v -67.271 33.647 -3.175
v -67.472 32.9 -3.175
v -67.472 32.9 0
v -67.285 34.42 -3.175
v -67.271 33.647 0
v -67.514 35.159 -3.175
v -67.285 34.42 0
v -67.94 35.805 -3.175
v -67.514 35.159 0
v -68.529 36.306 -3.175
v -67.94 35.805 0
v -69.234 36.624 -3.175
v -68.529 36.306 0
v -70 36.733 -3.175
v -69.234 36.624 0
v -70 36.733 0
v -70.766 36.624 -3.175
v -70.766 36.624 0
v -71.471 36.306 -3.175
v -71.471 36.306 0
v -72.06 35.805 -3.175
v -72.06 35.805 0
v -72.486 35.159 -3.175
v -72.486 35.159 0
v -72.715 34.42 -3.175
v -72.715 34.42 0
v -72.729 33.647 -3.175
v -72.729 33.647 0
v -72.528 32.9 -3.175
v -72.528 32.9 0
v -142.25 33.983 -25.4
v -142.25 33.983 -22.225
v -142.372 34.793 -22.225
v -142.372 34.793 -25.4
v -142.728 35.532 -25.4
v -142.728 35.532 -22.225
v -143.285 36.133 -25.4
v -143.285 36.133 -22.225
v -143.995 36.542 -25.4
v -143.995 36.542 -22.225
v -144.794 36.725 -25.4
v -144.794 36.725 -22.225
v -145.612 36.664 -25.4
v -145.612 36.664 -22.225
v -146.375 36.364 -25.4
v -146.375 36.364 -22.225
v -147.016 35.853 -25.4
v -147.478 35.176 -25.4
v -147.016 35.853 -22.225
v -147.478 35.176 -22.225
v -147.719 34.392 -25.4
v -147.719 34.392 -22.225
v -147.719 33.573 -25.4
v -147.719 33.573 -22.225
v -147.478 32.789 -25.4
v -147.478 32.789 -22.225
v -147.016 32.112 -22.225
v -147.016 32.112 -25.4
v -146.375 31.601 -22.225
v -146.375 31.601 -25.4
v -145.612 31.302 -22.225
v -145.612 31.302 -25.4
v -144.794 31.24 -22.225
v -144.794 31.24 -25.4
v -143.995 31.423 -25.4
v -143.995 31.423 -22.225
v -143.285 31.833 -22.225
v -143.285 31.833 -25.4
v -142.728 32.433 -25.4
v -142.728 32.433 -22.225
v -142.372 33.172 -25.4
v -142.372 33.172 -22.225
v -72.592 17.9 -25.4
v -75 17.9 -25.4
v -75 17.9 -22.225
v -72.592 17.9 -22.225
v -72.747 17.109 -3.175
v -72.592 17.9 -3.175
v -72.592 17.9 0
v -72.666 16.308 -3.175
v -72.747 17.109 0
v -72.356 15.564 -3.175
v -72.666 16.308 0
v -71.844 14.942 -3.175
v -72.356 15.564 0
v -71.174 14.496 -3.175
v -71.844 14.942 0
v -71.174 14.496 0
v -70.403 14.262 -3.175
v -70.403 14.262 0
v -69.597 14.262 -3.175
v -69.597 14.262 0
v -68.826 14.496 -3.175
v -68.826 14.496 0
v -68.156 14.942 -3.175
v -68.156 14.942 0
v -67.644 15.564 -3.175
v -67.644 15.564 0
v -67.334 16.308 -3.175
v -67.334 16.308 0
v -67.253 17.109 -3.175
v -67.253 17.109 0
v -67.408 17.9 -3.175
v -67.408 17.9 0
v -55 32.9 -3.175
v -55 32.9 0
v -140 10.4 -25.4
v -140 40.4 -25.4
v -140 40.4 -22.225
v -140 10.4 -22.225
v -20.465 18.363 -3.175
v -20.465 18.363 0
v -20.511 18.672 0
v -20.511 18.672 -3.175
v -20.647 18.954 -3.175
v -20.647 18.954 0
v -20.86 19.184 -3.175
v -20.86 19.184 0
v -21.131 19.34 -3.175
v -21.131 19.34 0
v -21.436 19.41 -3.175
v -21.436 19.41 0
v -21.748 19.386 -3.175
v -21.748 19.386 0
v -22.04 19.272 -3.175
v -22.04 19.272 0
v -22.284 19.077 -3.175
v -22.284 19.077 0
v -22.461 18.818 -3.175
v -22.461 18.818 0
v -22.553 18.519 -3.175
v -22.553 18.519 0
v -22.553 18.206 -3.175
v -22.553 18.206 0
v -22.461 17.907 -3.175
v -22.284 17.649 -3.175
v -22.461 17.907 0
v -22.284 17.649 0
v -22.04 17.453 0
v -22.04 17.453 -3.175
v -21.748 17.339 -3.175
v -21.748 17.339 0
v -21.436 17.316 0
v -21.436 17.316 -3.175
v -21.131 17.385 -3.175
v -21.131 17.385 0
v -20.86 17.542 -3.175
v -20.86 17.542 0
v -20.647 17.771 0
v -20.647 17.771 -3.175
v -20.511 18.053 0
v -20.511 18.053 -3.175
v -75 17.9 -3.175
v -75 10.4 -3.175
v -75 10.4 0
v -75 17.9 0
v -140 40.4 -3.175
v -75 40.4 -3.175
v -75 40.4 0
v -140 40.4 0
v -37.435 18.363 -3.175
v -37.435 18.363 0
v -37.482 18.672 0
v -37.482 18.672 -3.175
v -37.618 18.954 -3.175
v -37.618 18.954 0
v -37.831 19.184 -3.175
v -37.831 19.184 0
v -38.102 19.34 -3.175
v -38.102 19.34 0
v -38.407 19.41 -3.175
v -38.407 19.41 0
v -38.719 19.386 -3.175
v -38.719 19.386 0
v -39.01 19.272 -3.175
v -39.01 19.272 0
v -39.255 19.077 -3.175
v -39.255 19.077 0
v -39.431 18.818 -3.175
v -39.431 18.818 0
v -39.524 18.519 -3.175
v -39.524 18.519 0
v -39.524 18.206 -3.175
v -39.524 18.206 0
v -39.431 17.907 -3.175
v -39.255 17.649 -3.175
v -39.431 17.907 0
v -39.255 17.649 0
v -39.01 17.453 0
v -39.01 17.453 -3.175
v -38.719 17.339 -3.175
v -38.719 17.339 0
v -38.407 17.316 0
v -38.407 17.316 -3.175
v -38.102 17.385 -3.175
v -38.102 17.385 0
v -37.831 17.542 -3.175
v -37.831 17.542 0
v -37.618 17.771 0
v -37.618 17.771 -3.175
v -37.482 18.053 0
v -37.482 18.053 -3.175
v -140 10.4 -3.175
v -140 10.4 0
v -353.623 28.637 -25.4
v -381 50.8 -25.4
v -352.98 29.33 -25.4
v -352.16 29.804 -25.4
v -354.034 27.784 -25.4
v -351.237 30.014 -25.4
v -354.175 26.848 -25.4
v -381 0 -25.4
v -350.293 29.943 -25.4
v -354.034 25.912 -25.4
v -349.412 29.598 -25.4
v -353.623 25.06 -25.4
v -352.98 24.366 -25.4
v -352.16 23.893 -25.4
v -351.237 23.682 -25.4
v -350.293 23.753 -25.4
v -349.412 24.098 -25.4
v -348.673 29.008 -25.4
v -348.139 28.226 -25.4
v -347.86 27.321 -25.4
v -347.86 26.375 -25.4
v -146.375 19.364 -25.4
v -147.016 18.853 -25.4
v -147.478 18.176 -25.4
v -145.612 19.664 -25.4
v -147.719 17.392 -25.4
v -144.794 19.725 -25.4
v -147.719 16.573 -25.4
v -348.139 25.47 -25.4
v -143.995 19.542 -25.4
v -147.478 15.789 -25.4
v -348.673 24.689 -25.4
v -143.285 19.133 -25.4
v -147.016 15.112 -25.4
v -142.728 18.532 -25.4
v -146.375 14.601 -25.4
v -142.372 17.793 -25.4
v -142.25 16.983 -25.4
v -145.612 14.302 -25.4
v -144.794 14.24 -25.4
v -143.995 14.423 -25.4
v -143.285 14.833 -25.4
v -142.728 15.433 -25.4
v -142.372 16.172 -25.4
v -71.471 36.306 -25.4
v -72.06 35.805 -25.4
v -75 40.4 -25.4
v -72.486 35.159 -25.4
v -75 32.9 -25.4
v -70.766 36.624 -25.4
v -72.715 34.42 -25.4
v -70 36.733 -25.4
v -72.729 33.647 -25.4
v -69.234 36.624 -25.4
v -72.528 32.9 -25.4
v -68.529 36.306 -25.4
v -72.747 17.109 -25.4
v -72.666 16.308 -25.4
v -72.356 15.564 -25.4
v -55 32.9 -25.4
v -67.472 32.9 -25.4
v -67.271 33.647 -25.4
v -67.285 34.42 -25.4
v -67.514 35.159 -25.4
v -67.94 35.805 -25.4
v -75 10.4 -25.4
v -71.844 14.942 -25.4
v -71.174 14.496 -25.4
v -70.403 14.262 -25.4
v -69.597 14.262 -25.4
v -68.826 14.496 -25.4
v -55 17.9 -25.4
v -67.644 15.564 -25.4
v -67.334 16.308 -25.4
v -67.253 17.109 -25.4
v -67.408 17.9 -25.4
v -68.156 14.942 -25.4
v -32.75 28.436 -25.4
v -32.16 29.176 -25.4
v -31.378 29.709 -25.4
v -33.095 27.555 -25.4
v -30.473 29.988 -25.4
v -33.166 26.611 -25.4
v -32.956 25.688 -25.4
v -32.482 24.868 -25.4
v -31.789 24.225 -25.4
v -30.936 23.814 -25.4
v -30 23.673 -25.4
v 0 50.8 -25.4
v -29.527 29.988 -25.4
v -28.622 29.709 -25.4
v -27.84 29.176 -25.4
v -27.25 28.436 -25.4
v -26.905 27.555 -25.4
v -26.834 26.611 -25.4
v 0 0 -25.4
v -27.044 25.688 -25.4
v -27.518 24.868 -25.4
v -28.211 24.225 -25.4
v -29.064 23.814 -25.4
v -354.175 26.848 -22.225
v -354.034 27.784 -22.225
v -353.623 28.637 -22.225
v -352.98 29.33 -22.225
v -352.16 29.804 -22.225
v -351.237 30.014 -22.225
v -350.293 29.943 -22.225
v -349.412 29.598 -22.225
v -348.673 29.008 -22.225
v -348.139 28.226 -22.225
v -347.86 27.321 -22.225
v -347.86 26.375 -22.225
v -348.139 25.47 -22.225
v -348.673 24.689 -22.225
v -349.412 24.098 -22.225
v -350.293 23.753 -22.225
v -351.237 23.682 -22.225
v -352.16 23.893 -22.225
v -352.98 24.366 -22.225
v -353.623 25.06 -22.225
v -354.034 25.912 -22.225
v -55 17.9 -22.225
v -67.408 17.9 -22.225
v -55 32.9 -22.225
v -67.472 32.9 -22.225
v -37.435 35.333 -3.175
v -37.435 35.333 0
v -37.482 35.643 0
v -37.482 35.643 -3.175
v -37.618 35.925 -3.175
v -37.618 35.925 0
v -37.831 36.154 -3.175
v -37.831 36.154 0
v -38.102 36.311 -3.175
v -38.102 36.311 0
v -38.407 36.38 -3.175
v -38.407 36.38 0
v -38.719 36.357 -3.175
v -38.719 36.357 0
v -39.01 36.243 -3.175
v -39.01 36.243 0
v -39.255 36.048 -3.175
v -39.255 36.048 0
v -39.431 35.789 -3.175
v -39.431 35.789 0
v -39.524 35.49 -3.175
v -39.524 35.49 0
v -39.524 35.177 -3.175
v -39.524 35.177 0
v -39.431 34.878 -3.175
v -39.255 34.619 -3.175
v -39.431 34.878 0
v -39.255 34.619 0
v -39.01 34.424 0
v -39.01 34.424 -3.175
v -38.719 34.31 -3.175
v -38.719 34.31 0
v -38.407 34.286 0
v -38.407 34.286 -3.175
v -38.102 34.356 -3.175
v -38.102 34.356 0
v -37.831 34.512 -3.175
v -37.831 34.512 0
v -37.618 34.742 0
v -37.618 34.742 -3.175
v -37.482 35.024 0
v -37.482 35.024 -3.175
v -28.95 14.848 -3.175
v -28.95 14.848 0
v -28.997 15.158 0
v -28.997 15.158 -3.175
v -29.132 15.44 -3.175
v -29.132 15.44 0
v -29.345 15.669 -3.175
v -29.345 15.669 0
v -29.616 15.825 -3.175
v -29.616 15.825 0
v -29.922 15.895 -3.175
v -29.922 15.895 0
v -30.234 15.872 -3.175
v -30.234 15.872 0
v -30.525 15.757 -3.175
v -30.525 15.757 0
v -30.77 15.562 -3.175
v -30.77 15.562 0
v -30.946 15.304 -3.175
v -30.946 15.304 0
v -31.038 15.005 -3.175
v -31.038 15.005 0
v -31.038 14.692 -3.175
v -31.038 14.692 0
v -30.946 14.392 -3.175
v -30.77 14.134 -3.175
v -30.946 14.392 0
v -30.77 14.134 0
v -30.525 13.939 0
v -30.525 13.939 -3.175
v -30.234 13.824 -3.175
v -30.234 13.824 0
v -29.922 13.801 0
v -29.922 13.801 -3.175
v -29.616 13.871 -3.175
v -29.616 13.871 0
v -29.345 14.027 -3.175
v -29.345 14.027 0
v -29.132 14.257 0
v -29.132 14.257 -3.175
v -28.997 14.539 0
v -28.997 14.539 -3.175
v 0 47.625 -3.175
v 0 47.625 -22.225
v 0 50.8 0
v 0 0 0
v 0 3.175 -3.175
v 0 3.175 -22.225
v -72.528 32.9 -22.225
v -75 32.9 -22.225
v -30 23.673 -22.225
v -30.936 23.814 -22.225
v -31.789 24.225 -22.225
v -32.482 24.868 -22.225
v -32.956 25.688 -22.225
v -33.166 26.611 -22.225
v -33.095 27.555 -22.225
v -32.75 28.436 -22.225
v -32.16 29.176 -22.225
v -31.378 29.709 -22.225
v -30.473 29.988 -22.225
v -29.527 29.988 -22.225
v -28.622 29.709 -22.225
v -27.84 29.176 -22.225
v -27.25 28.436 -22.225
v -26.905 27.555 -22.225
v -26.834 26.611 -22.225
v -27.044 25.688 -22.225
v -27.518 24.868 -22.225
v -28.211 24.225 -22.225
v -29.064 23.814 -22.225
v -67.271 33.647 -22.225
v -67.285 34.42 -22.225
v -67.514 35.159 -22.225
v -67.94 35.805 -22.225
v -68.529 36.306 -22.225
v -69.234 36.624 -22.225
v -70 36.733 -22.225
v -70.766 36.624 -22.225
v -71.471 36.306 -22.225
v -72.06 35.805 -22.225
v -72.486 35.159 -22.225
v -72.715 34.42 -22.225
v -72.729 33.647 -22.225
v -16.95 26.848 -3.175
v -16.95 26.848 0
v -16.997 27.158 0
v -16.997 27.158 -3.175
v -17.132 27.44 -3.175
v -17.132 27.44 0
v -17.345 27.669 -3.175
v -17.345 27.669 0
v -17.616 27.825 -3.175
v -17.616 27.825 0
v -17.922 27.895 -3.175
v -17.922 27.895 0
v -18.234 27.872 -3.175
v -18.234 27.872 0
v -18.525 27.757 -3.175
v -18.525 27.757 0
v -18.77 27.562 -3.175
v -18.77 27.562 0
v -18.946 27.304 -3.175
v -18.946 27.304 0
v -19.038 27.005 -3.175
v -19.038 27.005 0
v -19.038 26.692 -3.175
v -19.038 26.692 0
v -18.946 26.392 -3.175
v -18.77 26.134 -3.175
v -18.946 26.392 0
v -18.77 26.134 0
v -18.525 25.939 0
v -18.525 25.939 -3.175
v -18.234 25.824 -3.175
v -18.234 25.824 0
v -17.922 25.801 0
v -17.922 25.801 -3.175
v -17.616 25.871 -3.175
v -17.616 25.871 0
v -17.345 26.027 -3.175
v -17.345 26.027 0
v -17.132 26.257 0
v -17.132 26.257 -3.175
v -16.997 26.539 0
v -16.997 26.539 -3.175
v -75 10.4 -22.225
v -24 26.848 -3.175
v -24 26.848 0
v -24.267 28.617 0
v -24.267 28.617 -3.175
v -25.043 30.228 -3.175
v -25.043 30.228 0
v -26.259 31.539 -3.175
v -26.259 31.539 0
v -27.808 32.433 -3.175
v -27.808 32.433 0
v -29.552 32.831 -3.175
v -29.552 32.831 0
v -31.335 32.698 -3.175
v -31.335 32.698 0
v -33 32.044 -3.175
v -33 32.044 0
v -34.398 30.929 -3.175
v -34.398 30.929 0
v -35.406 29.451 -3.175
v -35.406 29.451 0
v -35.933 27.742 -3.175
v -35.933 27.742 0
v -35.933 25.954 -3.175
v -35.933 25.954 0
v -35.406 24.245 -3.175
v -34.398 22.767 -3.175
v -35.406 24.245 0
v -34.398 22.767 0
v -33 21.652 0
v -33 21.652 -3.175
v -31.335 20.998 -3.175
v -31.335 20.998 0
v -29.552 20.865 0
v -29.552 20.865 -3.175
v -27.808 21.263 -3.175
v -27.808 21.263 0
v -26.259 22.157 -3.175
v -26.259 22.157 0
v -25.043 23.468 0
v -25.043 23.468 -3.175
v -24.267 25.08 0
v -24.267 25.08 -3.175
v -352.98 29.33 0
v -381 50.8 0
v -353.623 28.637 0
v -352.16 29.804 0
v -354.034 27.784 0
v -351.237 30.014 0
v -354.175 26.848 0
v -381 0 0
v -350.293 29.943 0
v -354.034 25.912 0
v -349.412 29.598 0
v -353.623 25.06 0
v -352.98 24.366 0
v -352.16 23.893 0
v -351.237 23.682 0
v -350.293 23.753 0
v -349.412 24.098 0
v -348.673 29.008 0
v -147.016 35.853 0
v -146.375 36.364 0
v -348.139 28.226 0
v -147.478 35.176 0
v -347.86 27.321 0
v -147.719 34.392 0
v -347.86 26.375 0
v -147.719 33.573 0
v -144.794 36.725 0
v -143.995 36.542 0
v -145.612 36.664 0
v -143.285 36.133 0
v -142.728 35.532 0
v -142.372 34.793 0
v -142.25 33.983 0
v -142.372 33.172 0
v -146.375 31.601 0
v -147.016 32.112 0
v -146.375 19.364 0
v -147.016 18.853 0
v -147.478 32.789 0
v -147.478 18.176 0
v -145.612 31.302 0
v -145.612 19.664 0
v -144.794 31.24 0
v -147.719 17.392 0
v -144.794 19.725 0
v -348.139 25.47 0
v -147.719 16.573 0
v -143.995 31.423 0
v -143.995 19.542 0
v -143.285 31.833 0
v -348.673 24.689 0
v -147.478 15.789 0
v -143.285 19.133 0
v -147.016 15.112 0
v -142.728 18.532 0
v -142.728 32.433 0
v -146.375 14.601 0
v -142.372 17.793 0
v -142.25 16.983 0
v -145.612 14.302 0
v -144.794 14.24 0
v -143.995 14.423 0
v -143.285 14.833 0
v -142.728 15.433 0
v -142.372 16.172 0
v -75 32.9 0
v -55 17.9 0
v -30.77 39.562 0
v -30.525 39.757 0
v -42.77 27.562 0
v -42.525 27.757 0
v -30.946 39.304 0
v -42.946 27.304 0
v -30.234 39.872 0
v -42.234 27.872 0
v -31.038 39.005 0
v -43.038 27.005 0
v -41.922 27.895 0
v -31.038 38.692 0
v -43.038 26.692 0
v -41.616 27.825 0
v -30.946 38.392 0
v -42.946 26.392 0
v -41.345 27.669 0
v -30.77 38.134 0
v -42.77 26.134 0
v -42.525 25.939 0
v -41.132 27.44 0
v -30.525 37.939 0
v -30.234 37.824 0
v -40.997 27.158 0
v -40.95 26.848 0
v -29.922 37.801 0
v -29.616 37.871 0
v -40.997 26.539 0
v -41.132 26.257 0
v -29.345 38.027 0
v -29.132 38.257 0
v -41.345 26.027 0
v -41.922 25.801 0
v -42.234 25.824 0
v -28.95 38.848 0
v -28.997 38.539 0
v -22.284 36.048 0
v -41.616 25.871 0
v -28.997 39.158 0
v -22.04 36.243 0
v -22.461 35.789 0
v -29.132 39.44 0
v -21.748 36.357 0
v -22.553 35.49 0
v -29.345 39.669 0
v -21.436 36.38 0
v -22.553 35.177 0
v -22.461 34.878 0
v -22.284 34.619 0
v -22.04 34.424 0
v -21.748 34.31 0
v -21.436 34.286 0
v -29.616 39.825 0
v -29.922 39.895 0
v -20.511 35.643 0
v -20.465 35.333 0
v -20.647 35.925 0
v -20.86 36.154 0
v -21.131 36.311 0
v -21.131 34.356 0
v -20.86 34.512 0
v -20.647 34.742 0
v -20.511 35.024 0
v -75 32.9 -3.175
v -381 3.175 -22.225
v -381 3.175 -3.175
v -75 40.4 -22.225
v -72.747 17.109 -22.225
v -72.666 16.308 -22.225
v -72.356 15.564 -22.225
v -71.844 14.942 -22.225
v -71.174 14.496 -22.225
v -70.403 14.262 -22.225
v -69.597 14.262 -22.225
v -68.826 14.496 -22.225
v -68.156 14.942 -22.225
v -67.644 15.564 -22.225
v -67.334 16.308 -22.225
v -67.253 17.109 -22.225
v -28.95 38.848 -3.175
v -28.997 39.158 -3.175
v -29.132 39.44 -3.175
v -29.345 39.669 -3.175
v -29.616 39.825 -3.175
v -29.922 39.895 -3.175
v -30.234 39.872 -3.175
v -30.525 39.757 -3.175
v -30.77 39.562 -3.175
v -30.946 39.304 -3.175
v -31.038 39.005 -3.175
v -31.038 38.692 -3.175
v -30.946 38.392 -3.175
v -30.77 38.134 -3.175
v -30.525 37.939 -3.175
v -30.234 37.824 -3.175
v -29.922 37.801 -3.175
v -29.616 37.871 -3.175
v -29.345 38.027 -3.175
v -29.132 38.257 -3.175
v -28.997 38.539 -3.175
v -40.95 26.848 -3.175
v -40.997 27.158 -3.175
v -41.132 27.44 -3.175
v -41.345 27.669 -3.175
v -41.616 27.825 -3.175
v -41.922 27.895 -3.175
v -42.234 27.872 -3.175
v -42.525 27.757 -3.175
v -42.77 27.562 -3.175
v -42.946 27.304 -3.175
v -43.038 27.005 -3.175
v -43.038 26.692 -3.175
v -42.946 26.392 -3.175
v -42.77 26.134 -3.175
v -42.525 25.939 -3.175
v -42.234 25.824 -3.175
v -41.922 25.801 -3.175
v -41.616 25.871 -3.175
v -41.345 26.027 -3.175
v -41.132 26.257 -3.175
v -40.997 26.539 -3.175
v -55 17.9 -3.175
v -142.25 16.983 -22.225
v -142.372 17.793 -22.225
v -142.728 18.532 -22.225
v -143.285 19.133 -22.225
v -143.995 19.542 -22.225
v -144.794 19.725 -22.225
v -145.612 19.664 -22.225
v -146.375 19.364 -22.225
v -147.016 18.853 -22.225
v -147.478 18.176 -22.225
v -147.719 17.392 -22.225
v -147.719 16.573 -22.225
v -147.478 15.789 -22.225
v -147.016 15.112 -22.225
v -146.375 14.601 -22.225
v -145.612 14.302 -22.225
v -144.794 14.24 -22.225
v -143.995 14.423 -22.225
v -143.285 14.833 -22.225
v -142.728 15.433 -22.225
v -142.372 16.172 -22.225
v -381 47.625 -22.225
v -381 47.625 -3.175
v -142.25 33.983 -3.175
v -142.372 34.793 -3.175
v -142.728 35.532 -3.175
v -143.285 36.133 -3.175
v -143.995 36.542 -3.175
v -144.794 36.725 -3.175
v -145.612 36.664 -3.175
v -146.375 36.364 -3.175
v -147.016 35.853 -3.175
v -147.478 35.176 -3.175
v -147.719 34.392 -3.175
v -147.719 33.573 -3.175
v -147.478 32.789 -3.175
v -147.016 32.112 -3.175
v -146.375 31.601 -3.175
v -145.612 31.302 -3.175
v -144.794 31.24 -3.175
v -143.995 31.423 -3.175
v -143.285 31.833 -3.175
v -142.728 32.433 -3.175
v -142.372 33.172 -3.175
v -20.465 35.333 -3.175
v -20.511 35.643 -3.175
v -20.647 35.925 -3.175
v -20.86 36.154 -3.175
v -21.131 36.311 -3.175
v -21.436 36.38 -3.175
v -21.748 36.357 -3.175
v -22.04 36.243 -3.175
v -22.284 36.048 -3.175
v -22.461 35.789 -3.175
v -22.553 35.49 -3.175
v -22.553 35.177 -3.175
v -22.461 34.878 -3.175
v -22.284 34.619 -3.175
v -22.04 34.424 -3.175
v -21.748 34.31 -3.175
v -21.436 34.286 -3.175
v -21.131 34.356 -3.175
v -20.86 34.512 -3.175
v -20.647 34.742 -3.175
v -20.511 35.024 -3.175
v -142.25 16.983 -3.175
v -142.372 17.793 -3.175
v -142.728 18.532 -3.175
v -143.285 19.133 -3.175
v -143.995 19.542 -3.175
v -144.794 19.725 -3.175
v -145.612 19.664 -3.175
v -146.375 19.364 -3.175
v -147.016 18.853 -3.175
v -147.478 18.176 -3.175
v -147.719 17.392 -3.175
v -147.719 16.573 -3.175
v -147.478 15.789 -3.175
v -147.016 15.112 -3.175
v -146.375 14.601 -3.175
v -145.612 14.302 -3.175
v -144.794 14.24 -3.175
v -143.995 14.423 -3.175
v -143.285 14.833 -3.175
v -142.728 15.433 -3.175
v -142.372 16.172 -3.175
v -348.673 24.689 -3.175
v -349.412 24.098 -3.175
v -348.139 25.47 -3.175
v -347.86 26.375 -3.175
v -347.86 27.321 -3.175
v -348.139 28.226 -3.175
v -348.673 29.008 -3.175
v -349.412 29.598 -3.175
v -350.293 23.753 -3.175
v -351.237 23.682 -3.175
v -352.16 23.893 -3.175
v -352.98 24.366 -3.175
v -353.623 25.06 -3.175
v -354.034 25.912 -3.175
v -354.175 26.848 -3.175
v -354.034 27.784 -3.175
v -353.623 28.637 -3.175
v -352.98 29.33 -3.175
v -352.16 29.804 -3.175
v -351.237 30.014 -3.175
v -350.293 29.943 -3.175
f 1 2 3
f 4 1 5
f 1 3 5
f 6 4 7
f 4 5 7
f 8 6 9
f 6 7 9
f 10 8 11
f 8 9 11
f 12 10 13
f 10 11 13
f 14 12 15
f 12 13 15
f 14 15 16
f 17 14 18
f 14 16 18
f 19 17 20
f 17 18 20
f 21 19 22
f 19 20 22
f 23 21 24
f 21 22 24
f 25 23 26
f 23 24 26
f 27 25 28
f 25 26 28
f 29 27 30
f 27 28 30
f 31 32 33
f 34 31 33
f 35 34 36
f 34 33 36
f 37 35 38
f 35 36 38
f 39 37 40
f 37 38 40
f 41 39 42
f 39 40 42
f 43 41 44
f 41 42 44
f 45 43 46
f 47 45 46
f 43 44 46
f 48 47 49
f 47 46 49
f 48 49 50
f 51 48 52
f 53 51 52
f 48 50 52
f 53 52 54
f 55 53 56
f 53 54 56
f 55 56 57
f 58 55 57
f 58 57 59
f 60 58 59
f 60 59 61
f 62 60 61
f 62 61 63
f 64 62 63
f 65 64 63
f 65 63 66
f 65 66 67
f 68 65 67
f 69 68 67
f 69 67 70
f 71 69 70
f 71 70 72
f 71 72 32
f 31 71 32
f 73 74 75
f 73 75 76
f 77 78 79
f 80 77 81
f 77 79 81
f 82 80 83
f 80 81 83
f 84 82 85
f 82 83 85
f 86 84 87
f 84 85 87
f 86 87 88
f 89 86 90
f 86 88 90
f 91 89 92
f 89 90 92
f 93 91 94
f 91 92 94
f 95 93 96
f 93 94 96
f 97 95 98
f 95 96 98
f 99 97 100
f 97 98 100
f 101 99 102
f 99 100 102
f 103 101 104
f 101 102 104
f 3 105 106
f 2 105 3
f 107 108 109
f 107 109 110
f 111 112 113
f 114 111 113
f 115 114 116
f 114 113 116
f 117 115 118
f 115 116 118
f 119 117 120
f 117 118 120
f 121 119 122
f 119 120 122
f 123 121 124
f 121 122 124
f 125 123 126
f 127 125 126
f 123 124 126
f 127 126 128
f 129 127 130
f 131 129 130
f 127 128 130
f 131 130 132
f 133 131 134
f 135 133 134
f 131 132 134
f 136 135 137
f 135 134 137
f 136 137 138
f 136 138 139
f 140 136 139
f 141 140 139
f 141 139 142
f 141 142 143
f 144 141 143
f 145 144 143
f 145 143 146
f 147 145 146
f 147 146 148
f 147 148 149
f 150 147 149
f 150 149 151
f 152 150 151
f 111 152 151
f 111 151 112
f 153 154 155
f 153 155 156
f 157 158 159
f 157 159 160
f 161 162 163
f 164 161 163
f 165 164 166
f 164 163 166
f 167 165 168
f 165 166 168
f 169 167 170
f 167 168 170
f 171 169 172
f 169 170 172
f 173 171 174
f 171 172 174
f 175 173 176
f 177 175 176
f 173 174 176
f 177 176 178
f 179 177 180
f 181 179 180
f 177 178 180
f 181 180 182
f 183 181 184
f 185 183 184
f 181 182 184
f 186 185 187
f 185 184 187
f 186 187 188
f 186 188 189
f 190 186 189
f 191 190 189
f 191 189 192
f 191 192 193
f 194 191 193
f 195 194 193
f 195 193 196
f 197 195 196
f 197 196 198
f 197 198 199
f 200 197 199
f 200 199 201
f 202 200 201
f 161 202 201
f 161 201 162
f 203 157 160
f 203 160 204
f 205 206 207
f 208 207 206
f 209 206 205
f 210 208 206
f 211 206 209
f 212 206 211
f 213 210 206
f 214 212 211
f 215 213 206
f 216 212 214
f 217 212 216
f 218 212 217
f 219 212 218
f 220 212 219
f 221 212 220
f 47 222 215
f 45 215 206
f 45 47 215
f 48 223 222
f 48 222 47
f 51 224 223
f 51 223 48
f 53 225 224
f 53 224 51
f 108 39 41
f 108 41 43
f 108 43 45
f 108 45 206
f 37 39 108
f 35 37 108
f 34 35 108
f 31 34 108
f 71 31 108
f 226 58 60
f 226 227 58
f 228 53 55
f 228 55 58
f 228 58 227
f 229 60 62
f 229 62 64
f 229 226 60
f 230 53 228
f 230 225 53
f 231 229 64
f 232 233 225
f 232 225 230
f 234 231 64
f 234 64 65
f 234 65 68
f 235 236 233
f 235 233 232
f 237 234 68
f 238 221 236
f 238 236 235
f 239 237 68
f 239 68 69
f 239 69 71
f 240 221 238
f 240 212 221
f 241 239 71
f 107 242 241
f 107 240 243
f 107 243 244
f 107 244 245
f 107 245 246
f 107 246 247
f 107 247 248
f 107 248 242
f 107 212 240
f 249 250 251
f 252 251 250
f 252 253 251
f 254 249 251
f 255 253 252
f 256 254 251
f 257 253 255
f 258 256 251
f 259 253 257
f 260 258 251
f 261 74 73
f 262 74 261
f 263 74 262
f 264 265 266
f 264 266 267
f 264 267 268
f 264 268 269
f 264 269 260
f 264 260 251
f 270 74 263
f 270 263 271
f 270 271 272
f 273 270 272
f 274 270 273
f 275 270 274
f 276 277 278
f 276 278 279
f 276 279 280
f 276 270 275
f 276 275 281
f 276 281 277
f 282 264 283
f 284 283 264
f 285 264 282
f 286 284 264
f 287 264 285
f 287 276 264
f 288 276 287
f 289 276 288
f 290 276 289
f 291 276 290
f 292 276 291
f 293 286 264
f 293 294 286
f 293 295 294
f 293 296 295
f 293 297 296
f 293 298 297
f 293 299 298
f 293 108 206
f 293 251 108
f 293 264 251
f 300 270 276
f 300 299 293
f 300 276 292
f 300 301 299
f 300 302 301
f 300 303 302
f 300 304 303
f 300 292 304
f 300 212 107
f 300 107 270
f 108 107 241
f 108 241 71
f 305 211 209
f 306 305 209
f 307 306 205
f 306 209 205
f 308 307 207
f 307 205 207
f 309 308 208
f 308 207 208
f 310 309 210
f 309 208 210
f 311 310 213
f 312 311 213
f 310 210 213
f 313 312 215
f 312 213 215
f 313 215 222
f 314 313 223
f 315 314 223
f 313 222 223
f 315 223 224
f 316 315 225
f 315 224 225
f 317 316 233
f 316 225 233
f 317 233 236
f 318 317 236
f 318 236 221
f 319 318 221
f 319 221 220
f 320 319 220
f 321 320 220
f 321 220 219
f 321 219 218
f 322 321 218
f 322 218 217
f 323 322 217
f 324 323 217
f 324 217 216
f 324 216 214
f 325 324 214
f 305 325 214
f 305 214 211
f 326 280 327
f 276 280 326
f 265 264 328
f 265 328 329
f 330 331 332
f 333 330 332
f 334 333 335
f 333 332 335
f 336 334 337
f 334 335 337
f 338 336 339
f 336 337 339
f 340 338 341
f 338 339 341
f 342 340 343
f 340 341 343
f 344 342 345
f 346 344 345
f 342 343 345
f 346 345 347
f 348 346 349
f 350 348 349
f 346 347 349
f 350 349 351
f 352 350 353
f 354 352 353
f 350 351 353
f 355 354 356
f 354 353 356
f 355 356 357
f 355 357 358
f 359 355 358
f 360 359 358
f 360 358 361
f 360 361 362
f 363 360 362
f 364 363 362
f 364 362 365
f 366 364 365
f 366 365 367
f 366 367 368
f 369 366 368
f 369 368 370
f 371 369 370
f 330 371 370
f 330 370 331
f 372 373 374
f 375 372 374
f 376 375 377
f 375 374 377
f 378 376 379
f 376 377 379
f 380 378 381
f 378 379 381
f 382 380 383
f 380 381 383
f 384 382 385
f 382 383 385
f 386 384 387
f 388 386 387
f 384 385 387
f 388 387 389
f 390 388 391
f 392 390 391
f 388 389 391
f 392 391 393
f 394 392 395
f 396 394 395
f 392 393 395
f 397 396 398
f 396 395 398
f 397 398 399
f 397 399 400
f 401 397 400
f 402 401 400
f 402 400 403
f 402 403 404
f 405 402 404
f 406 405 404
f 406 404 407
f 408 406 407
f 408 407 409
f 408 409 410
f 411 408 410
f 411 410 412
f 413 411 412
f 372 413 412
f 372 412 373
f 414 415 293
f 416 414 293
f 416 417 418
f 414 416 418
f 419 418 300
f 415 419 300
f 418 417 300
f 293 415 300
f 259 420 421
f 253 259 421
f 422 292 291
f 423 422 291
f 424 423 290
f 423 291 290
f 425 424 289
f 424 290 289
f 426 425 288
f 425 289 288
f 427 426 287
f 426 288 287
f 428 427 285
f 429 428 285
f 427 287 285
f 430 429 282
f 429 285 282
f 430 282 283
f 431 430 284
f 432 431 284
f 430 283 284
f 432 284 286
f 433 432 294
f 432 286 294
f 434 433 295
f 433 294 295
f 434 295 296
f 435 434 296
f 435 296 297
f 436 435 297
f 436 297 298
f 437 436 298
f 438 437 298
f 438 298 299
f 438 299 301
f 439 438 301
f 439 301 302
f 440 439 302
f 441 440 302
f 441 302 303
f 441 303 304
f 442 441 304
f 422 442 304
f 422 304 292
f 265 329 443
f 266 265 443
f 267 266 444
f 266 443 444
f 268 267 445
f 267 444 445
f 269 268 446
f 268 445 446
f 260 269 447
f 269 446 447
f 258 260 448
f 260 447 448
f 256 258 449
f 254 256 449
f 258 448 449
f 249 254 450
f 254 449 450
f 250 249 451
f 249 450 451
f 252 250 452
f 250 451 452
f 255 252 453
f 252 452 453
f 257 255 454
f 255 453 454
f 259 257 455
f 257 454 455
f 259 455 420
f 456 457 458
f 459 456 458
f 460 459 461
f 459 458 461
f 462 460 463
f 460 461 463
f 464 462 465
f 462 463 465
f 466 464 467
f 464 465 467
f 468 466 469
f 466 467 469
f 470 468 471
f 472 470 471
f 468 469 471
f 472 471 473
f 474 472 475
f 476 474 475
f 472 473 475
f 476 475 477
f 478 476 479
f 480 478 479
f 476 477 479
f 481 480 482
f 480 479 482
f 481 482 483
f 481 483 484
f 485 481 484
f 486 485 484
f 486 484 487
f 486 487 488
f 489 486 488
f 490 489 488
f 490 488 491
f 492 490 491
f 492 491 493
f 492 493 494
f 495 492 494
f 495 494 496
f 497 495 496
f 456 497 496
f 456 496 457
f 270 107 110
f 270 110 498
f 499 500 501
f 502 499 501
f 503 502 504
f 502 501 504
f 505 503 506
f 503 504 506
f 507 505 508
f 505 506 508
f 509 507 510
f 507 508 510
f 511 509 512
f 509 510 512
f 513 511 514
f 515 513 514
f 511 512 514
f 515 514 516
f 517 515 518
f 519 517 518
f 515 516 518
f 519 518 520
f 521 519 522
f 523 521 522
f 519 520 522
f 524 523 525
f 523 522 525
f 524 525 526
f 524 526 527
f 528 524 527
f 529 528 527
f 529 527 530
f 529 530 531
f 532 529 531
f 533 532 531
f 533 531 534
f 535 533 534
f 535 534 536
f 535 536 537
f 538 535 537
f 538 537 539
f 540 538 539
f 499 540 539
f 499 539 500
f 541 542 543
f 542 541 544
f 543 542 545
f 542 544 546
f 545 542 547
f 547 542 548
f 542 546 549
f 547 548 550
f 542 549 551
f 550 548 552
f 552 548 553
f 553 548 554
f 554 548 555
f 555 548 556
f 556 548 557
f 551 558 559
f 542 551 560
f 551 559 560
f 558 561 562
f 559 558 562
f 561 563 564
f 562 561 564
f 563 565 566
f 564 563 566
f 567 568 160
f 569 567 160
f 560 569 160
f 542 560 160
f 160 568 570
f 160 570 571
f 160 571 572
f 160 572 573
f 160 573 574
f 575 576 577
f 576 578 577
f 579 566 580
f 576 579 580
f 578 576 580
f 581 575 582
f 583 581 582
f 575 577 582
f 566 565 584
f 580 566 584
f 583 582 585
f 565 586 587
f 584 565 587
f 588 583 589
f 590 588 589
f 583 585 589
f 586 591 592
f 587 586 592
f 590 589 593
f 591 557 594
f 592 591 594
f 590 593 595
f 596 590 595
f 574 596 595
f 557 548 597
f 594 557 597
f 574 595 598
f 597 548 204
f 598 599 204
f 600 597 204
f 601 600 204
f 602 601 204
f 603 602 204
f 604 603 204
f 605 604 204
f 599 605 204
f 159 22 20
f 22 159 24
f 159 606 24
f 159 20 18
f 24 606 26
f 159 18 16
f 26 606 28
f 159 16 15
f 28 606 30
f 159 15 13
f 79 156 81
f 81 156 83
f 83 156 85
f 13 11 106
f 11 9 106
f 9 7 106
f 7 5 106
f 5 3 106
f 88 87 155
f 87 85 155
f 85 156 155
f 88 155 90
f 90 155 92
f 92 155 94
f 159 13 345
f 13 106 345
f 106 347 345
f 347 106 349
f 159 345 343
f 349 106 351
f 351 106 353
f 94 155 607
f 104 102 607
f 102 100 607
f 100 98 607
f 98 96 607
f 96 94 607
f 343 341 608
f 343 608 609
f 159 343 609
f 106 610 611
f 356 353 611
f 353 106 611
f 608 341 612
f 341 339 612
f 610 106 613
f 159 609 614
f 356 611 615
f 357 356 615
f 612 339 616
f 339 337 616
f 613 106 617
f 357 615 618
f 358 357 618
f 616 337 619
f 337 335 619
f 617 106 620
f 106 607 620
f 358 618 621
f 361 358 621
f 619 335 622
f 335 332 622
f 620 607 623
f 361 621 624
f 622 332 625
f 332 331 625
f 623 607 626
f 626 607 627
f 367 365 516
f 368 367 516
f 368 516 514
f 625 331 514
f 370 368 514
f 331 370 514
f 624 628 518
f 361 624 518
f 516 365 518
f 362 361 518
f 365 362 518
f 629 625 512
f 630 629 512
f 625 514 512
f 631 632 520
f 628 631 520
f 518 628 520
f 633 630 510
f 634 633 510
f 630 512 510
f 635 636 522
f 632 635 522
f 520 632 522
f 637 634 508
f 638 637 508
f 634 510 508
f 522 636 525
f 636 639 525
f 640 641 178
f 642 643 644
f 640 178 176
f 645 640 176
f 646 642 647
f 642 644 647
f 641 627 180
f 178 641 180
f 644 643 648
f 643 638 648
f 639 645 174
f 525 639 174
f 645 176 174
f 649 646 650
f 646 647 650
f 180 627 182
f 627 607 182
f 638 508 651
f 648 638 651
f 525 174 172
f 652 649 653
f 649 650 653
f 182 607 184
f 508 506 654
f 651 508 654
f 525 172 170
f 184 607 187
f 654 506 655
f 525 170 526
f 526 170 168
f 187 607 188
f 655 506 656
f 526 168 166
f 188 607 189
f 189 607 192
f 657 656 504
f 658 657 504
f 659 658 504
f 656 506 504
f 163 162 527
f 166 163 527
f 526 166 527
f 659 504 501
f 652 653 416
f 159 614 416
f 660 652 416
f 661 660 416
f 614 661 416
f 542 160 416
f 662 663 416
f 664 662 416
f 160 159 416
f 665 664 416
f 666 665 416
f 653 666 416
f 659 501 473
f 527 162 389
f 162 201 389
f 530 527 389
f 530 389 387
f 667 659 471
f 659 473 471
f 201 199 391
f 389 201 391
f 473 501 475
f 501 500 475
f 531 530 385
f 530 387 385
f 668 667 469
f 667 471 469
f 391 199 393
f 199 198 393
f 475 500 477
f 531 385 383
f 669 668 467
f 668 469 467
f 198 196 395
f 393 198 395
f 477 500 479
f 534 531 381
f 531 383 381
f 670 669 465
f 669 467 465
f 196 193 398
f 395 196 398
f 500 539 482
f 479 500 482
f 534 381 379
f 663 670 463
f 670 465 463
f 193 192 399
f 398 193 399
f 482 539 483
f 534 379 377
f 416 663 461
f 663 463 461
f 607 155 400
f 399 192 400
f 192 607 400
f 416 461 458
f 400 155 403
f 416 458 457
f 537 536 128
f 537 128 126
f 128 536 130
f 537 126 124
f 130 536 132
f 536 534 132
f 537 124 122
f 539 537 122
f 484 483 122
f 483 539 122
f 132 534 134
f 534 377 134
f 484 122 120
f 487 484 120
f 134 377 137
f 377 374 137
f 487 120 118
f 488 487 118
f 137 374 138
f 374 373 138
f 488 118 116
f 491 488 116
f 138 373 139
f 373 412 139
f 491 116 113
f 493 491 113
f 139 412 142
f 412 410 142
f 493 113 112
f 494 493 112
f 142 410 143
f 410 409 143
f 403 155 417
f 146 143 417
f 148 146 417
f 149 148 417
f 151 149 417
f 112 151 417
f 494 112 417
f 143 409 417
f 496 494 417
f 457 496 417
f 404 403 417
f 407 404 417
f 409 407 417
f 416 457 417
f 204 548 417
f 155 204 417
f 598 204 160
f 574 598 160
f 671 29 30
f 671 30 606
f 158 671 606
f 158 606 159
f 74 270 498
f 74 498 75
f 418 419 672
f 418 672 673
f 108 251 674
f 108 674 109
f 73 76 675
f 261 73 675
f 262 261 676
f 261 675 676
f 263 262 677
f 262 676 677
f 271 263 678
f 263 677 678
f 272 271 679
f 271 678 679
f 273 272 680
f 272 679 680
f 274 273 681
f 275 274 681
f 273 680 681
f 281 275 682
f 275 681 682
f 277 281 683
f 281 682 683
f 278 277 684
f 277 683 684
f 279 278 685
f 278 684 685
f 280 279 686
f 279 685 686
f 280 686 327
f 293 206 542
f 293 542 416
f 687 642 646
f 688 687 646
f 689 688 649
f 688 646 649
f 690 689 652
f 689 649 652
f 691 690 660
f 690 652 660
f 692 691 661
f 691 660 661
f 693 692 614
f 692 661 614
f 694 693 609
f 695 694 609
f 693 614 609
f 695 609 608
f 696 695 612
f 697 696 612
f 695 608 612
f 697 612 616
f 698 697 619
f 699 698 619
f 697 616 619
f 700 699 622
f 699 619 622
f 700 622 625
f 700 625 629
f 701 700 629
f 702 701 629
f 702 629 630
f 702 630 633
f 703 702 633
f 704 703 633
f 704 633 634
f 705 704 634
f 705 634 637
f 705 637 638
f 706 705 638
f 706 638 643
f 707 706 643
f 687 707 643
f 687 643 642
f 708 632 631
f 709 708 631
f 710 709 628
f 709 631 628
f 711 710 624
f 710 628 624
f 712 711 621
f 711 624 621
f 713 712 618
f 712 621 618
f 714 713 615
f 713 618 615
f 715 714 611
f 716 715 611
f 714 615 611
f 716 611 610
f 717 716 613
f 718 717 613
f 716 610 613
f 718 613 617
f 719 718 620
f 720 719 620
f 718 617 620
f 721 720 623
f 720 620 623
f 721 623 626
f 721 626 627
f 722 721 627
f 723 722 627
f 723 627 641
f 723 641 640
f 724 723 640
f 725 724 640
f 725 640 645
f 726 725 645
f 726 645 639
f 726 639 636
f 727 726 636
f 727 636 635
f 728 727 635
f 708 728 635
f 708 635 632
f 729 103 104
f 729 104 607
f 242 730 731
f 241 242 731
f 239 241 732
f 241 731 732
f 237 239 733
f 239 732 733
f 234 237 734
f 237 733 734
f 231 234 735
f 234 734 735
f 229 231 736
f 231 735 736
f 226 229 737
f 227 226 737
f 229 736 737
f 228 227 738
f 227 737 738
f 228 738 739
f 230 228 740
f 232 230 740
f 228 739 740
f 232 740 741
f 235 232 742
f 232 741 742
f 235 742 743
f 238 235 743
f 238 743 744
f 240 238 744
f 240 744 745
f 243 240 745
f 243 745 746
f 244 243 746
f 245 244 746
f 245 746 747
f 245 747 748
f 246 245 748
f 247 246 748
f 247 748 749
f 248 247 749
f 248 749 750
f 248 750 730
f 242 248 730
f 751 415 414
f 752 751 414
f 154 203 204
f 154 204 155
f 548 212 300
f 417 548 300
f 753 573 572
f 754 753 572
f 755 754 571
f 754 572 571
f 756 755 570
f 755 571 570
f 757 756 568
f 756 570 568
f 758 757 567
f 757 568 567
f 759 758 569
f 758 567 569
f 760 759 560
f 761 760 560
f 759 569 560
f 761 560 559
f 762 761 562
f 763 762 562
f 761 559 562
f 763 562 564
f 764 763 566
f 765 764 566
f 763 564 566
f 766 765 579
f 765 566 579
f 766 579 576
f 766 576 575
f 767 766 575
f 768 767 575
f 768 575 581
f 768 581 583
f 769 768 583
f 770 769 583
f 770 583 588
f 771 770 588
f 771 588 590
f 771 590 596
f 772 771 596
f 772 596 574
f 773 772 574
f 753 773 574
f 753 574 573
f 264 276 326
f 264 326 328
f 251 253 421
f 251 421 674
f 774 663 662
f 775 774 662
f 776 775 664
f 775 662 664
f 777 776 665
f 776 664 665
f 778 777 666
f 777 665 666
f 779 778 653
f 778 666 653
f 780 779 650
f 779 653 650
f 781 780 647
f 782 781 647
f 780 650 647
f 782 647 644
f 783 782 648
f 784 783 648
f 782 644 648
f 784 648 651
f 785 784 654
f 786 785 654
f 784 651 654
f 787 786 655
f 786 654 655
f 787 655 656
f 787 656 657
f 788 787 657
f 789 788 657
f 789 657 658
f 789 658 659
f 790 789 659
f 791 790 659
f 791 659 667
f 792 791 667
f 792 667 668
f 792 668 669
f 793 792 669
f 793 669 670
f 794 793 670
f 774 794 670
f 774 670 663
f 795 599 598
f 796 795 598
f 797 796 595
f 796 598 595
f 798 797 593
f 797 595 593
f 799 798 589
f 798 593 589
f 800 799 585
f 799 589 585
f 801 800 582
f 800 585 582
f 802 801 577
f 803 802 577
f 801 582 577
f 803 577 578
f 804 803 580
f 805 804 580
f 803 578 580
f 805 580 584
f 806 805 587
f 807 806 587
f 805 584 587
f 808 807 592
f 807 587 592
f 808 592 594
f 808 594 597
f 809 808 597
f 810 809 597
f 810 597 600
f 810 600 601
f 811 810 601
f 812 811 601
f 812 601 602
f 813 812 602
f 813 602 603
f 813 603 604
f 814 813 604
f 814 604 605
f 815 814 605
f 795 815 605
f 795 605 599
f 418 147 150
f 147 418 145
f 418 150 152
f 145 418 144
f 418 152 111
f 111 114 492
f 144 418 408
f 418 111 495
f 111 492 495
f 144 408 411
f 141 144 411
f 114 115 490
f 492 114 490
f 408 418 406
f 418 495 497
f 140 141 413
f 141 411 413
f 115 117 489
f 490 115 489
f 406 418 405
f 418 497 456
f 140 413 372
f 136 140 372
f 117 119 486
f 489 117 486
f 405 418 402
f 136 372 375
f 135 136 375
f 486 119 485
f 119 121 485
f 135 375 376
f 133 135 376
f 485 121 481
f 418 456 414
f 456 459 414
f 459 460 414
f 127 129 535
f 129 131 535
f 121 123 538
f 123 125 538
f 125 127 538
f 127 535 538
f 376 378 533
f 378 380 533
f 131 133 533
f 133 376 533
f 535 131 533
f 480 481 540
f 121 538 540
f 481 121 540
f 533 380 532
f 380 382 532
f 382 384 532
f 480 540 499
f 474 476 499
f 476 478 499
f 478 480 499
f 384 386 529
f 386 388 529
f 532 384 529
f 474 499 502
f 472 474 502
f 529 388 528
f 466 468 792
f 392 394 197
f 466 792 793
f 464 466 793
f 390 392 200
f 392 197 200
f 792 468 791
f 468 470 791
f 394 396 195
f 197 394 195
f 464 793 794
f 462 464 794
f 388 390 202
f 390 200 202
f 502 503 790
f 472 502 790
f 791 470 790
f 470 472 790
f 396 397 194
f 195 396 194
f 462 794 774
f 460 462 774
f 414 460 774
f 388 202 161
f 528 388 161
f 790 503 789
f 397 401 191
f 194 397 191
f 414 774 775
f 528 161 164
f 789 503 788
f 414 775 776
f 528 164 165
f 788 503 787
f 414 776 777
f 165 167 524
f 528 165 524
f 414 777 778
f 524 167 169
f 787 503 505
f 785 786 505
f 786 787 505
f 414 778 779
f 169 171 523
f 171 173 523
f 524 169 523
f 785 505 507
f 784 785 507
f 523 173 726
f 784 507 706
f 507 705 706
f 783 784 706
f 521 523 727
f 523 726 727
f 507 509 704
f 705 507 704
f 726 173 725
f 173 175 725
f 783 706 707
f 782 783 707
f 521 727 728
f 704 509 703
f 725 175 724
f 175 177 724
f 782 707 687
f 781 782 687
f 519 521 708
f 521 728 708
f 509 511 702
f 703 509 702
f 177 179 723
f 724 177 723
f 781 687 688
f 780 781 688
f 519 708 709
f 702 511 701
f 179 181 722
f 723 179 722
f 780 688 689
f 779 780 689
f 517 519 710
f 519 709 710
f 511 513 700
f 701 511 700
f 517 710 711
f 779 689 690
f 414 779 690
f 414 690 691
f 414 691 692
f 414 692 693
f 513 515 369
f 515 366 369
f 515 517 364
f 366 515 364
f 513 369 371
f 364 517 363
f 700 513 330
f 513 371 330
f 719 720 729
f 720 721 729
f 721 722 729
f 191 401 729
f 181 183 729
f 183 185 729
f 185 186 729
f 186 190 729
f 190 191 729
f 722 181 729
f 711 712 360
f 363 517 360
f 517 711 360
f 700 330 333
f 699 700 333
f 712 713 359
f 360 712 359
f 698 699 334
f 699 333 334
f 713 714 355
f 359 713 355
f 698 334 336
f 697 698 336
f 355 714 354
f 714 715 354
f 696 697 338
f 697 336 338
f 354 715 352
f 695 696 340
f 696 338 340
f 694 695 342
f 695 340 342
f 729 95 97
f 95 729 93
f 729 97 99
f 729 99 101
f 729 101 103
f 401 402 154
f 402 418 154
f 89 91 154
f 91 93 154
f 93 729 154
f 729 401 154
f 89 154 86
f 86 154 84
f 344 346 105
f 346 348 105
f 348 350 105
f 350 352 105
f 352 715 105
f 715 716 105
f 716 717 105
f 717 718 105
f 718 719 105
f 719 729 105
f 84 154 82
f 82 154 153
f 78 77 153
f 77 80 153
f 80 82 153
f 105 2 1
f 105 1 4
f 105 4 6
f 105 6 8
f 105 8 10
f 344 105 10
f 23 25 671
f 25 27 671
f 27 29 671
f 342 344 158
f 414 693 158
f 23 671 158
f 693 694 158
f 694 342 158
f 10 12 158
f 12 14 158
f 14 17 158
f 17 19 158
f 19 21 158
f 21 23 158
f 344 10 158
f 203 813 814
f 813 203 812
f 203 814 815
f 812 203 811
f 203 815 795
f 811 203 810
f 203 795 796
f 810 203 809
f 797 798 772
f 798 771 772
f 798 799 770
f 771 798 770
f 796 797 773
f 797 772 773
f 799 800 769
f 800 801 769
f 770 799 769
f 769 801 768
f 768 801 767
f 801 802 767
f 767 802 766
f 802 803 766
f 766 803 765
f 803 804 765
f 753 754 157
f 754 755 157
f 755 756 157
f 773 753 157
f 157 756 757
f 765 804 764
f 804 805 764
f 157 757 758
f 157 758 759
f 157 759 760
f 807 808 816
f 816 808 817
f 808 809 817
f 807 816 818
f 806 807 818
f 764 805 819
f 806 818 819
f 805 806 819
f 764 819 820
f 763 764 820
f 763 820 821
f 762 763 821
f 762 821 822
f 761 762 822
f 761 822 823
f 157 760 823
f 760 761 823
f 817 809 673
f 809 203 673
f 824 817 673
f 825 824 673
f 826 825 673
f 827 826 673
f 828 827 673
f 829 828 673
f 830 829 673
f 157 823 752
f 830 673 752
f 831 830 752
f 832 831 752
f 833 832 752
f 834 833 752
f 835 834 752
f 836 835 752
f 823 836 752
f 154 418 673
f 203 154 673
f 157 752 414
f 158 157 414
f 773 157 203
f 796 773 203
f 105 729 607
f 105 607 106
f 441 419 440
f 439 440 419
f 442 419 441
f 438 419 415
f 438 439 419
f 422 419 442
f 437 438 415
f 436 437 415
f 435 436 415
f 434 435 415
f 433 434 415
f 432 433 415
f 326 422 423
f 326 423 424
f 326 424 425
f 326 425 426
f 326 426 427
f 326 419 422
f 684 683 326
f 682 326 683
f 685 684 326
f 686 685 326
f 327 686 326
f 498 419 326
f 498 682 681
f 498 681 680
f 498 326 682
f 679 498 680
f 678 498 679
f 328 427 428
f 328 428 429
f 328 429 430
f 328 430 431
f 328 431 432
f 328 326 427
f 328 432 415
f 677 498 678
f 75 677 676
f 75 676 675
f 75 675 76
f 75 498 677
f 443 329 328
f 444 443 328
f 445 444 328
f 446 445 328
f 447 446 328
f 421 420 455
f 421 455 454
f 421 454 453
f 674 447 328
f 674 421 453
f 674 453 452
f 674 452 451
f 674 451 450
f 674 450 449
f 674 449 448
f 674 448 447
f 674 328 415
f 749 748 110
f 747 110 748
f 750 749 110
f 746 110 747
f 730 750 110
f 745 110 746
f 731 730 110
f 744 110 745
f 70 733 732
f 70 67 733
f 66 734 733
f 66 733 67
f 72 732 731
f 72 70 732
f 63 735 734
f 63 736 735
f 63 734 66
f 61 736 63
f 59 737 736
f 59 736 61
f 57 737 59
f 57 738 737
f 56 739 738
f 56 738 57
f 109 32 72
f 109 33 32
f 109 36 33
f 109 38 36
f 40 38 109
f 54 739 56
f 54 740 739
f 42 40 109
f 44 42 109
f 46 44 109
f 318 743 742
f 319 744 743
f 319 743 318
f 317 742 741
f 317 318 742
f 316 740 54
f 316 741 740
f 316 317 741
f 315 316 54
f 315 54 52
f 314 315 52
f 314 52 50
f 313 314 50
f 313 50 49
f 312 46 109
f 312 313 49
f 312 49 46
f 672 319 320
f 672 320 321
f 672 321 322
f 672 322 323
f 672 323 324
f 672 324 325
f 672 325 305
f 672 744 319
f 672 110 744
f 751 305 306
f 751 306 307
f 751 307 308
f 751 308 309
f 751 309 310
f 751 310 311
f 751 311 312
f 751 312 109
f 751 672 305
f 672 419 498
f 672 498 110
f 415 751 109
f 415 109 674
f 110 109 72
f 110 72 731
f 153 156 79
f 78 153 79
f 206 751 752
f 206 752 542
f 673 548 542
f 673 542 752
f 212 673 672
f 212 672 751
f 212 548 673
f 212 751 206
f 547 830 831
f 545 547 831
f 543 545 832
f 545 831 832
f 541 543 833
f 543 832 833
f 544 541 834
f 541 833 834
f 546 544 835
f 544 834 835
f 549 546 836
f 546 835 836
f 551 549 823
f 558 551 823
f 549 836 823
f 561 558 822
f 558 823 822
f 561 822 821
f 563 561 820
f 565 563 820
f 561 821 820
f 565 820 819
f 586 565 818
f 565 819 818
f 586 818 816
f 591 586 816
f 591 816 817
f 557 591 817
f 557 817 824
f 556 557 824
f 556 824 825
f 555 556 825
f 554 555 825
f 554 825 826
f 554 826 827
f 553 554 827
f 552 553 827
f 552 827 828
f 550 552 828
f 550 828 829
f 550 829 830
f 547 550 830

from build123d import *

# Parameters (mm, degrees)
SKETCH1_W           = 381
SKETCH1_H           = 25.4
BOSS_EXTRUDE1_DEPTH = 50.8
SKETCH2_W           = 19.05
SKETCH2_H           = 44.45
CUT_EXTRUDE1_DEPTH  = 386.210072558
SKETCH3_R           = 3.175
CUT_EXTRUDE2_DEPTH  = 386.210072558
CUT_EXTRUDE3_START  = -25.4
CUT_EXTRUDE3_DEPTH  = 25.4
SKETCH7_R           = 2.75
CUT_EXTRUDE4_DEPTH  = 386.210072558
CUT_EXTRUDE5_REACH  = 387.21
SKETCH8_R           = 6
SKETCH8_R_2         = 1.05


with BuildPart() as part:
    # Sketch1 → Boss-Extrude1 (new body)
    with BuildSketch(Plane(origin=(0, 0, 0), x_dir=(1, 0, 0), z_dir=(0, 1, 0))):
        with Locations((-190.5, 12.7)):
            Rectangle(SKETCH1_W, SKETCH1_H)
    extrude(amount=BOSS_EXTRUDE1_DEPTH)

    # Sketch2 → Cut-Extrude1 (cut, through all)
    with BuildSketch(Plane.ZY.offset(381)):
        with Locations((-12.7, 25.4)):
            Rectangle(SKETCH2_W, SKETCH2_H)
    extrude(amount=-CUT_EXTRUDE1_DEPTH, mode=Mode.SUBTRACT)

    # Sketch3 → Cut-Extrude2 (cut, through all)
    with BuildSketch(Plane(origin=(0, 0, -25.4), x_dir=(-1, 0, 0), z_dir=(0, 0, -1))):
        with Locations((351, 26.848062316)):
            Circle(SKETCH3_R)
        with Locations(Location((30, 26.848062316, 0), (0, 0, 270))):
            Circle(SKETCH3_R)
    extrude(amount=-CUT_EXTRUDE2_DEPTH, mode=Mode.SUBTRACT)

    # Sketch5 → Cut-Extrude3 (cut)
    with BuildSketch(Plane.XY.offset(CUT_EXTRUDE3_START)):
        Polygon((-75, 32.9), (-75, 40.4), (-140, 40.4), (-140, 10.4), (-75, 10.4), (-75, 17.9), (-55, 17.9), (-55, 32.9), align=None)
    extrude(amount=CUT_EXTRUDE3_DEPTH, mode=Mode.SUBTRACT)

    # Sketch7 → Cut-Extrude4 (cut, through all)
    with BuildSketch(Plane.XY):
        with Locations((-145, 33.982591354)):
            Circle(SKETCH7_R)
        with Locations((-70, 33.982591354)):
            Circle(SKETCH7_R)
        with Locations((-145, 16.982591354)):
            Circle(SKETCH7_R)
        with Locations((-70, 16.982591354)):
            Circle(SKETCH7_R)
    extrude(amount=-CUT_EXTRUDE4_DEPTH, mode=Mode.SUBTRACT)

    # Sketch8 → Cut-Extrude5 (cut, up to next)
    with BuildSketch(Plane.XY, mode=Mode.PRIVATE) as cut_extrude5_sk1:
        with Locations((-30, 26.848062316)):
            Circle(SKETCH8_R)
    cut_extrude5_tool1 = extrude(cut_extrude5_sk1.sketch, amount=-CUT_EXTRUDE5_REACH, mode=Mode.PRIVATE) & part.part
    # Sketch8 → Cut-Extrude5 (cut, up to next)
    with BuildSketch(Plane.XY, mode=Mode.PRIVATE) as cut_extrude5_sk2:
        with Locations((-30, 38.848062316)):
            Circle(SKETCH8_R_2)
    cut_extrude5_tool2 = extrude(cut_extrude5_sk2.sketch, amount=-CUT_EXTRUDE5_REACH, mode=Mode.PRIVATE) & part.part
    # Sketch8 → Cut-Extrude5 (cut, up to next)
    with BuildSketch(Plane.XY, mode=Mode.PRIVATE) as cut_extrude5_sk3:
        with Locations((-21.514718626, 35.33334369)):
            Circle(SKETCH8_R_2)
    cut_extrude5_tool3 = extrude(cut_extrude5_sk3.sketch, amount=-CUT_EXTRUDE5_REACH, mode=Mode.PRIVATE) & part.part
    # Sketch8 → Cut-Extrude5 (cut, up to next)
    with BuildSketch(Plane.XY, mode=Mode.PRIVATE) as cut_extrude5_sk4:
        with Locations((-18, 26.848062316)):
            Circle(SKETCH8_R_2)
    cut_extrude5_tool4 = extrude(cut_extrude5_sk4.sketch, amount=-CUT_EXTRUDE5_REACH, mode=Mode.PRIVATE) & part.part
    # Sketch8 → Cut-Extrude5 (cut, up to next)
    with BuildSketch(Plane.XY, mode=Mode.PRIVATE) as cut_extrude5_sk5:
        with Locations((-21.514718626, 18.362780942)):
            Circle(SKETCH8_R_2)
    cut_extrude5_tool5 = extrude(cut_extrude5_sk5.sketch, amount=-CUT_EXTRUDE5_REACH, mode=Mode.PRIVATE) & part.part
    # Sketch8 → Cut-Extrude5 (cut, up to next)
    with BuildSketch(Plane.XY, mode=Mode.PRIVATE) as cut_extrude5_sk6:
        with Locations((-30, 14.848062316)):
            Circle(SKETCH8_R_2)
    cut_extrude5_tool6 = extrude(cut_extrude5_sk6.sketch, amount=-CUT_EXTRUDE5_REACH, mode=Mode.PRIVATE) & part.part
    # Sketch8 → Cut-Extrude5 (cut, up to next)
    with BuildSketch(Plane.XY, mode=Mode.PRIVATE) as cut_extrude5_sk7:
        with Locations((-38.485281374, 18.362780942)):
            Circle(SKETCH8_R_2)
    cut_extrude5_tool7 = extrude(cut_extrude5_sk7.sketch, amount=-CUT_EXTRUDE5_REACH, mode=Mode.PRIVATE) & part.part
    # Sketch8 → Cut-Extrude5 (cut, up to next)
    with BuildSketch(Plane.XY, mode=Mode.PRIVATE) as cut_extrude5_sk8:
        with Locations((-42, 26.848062316)):
            Circle(SKETCH8_R_2)
    cut_extrude5_tool8 = extrude(cut_extrude5_sk8.sketch, amount=-CUT_EXTRUDE5_REACH, mode=Mode.PRIVATE) & part.part
    # Sketch8 → Cut-Extrude5 (cut, up to next)
    with BuildSketch(Plane.XY, mode=Mode.PRIVATE) as cut_extrude5_sk9:
        with Locations((-38.485281374, 35.33334369)):
            Circle(SKETCH8_R_2)
    cut_extrude5_tool9 = extrude(cut_extrude5_sk9.sketch, amount=-CUT_EXTRUDE5_REACH, mode=Mode.PRIVATE) & part.part
    add(cut_extrude5_tool1.solids().sort_by_distance((-30, 26.848062, 0))[0], mode=Mode.SUBTRACT)
    add(cut_extrude5_tool2.solids().sort_by_distance((-30, 38.848062, 0))[0], mode=Mode.SUBTRACT)
    add(cut_extrude5_tool3.solids().sort_by_distance((-21.514719, 35.333344, 0))[0], mode=Mode.SUBTRACT)
    add(cut_extrude5_tool4.solids().sort_by_distance((-18, 26.848062, 0))[0], mode=Mode.SUBTRACT)
    add(cut_extrude5_tool5.solids().sort_by_distance((-21.514719, 18.362781, 0))[0], mode=Mode.SUBTRACT)
    add(cut_extrude5_tool6.solids().sort_by_distance((-30, 14.848062, 0))[0], mode=Mode.SUBTRACT)
    add(cut_extrude5_tool7.solids().sort_by_distance((-38.485281, 18.362781, 0))[0], mode=Mode.SUBTRACT)
    add(cut_extrude5_tool8.solids().sort_by_distance((-42, 26.848062, 0))[0], mode=Mode.SUBTRACT)
    add(cut_extrude5_tool9.solids().sort_by_distance((-38.485281, 35.333344, 0))[0], mode=Mode.SUBTRACT)


solid = part.part
